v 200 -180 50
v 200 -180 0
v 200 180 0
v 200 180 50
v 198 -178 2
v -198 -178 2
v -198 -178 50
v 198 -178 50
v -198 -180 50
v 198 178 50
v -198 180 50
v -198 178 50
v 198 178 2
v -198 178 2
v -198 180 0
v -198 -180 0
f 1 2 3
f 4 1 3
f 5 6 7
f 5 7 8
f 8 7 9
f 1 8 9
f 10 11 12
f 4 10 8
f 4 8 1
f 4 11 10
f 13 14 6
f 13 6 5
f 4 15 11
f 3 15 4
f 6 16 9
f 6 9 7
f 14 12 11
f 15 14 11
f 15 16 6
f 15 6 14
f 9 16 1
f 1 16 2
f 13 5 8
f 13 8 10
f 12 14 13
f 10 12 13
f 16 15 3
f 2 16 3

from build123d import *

# Parameters (mm, degrees)
ESQUISSE1_W                  = 400
ESQUISSE1_H                  = 360
BOSS_EXTRU_1_DEPTH           = 50
COQUE1_T                     = -2
ENL_V_MAT_EXTRU_2_DEPTH      = 274.678643668
ENL_V_MAT_EXTRU_2_DEPTH_BACK = 50


with BuildPart() as part:
    # Esquisse1 → Boss.-Extru.1 (new body)
    with BuildSketch(Plane.XY):
        Rectangle(ESQUISSE1_W, ESQUISSE1_H)
    extrude(amount=BOSS_EXTRU_1_DEPTH)

    # Coque1
    coque1_openings = [part.faces().sort_by_distance(p)[0] for p in [
        (0, 0, 50),
    ]]
    offset(amount=COQUE1_T, openings=coque1_openings, kind=Kind.INTERSECTION)

    # Esquisse2 → Enlèv. mat.-Extru.2 (cut, two sides: drawn at the far end of the back side and taken through both)
    with BuildSketch(Plane.XY.offset(50).offset(-ENL_V_MAT_EXTRU_2_DEPTH_BACK)):
        Polygon((909.035446725, -180), (-177.254477041, -180), (-198, -180), (-198, 180), (-200, 180), (-200, -180), (-200, -1266.289923766), (1320.247473242, -2818.369436549), (2429.282919967, -1732.079512783), align=None)
    extrude(amount=ENL_V_MAT_EXTRU_2_DEPTH + ENL_V_MAT_EXTRU_2_DEPTH_BACK, mode=Mode.SUBTRACT)


solid = part.part
